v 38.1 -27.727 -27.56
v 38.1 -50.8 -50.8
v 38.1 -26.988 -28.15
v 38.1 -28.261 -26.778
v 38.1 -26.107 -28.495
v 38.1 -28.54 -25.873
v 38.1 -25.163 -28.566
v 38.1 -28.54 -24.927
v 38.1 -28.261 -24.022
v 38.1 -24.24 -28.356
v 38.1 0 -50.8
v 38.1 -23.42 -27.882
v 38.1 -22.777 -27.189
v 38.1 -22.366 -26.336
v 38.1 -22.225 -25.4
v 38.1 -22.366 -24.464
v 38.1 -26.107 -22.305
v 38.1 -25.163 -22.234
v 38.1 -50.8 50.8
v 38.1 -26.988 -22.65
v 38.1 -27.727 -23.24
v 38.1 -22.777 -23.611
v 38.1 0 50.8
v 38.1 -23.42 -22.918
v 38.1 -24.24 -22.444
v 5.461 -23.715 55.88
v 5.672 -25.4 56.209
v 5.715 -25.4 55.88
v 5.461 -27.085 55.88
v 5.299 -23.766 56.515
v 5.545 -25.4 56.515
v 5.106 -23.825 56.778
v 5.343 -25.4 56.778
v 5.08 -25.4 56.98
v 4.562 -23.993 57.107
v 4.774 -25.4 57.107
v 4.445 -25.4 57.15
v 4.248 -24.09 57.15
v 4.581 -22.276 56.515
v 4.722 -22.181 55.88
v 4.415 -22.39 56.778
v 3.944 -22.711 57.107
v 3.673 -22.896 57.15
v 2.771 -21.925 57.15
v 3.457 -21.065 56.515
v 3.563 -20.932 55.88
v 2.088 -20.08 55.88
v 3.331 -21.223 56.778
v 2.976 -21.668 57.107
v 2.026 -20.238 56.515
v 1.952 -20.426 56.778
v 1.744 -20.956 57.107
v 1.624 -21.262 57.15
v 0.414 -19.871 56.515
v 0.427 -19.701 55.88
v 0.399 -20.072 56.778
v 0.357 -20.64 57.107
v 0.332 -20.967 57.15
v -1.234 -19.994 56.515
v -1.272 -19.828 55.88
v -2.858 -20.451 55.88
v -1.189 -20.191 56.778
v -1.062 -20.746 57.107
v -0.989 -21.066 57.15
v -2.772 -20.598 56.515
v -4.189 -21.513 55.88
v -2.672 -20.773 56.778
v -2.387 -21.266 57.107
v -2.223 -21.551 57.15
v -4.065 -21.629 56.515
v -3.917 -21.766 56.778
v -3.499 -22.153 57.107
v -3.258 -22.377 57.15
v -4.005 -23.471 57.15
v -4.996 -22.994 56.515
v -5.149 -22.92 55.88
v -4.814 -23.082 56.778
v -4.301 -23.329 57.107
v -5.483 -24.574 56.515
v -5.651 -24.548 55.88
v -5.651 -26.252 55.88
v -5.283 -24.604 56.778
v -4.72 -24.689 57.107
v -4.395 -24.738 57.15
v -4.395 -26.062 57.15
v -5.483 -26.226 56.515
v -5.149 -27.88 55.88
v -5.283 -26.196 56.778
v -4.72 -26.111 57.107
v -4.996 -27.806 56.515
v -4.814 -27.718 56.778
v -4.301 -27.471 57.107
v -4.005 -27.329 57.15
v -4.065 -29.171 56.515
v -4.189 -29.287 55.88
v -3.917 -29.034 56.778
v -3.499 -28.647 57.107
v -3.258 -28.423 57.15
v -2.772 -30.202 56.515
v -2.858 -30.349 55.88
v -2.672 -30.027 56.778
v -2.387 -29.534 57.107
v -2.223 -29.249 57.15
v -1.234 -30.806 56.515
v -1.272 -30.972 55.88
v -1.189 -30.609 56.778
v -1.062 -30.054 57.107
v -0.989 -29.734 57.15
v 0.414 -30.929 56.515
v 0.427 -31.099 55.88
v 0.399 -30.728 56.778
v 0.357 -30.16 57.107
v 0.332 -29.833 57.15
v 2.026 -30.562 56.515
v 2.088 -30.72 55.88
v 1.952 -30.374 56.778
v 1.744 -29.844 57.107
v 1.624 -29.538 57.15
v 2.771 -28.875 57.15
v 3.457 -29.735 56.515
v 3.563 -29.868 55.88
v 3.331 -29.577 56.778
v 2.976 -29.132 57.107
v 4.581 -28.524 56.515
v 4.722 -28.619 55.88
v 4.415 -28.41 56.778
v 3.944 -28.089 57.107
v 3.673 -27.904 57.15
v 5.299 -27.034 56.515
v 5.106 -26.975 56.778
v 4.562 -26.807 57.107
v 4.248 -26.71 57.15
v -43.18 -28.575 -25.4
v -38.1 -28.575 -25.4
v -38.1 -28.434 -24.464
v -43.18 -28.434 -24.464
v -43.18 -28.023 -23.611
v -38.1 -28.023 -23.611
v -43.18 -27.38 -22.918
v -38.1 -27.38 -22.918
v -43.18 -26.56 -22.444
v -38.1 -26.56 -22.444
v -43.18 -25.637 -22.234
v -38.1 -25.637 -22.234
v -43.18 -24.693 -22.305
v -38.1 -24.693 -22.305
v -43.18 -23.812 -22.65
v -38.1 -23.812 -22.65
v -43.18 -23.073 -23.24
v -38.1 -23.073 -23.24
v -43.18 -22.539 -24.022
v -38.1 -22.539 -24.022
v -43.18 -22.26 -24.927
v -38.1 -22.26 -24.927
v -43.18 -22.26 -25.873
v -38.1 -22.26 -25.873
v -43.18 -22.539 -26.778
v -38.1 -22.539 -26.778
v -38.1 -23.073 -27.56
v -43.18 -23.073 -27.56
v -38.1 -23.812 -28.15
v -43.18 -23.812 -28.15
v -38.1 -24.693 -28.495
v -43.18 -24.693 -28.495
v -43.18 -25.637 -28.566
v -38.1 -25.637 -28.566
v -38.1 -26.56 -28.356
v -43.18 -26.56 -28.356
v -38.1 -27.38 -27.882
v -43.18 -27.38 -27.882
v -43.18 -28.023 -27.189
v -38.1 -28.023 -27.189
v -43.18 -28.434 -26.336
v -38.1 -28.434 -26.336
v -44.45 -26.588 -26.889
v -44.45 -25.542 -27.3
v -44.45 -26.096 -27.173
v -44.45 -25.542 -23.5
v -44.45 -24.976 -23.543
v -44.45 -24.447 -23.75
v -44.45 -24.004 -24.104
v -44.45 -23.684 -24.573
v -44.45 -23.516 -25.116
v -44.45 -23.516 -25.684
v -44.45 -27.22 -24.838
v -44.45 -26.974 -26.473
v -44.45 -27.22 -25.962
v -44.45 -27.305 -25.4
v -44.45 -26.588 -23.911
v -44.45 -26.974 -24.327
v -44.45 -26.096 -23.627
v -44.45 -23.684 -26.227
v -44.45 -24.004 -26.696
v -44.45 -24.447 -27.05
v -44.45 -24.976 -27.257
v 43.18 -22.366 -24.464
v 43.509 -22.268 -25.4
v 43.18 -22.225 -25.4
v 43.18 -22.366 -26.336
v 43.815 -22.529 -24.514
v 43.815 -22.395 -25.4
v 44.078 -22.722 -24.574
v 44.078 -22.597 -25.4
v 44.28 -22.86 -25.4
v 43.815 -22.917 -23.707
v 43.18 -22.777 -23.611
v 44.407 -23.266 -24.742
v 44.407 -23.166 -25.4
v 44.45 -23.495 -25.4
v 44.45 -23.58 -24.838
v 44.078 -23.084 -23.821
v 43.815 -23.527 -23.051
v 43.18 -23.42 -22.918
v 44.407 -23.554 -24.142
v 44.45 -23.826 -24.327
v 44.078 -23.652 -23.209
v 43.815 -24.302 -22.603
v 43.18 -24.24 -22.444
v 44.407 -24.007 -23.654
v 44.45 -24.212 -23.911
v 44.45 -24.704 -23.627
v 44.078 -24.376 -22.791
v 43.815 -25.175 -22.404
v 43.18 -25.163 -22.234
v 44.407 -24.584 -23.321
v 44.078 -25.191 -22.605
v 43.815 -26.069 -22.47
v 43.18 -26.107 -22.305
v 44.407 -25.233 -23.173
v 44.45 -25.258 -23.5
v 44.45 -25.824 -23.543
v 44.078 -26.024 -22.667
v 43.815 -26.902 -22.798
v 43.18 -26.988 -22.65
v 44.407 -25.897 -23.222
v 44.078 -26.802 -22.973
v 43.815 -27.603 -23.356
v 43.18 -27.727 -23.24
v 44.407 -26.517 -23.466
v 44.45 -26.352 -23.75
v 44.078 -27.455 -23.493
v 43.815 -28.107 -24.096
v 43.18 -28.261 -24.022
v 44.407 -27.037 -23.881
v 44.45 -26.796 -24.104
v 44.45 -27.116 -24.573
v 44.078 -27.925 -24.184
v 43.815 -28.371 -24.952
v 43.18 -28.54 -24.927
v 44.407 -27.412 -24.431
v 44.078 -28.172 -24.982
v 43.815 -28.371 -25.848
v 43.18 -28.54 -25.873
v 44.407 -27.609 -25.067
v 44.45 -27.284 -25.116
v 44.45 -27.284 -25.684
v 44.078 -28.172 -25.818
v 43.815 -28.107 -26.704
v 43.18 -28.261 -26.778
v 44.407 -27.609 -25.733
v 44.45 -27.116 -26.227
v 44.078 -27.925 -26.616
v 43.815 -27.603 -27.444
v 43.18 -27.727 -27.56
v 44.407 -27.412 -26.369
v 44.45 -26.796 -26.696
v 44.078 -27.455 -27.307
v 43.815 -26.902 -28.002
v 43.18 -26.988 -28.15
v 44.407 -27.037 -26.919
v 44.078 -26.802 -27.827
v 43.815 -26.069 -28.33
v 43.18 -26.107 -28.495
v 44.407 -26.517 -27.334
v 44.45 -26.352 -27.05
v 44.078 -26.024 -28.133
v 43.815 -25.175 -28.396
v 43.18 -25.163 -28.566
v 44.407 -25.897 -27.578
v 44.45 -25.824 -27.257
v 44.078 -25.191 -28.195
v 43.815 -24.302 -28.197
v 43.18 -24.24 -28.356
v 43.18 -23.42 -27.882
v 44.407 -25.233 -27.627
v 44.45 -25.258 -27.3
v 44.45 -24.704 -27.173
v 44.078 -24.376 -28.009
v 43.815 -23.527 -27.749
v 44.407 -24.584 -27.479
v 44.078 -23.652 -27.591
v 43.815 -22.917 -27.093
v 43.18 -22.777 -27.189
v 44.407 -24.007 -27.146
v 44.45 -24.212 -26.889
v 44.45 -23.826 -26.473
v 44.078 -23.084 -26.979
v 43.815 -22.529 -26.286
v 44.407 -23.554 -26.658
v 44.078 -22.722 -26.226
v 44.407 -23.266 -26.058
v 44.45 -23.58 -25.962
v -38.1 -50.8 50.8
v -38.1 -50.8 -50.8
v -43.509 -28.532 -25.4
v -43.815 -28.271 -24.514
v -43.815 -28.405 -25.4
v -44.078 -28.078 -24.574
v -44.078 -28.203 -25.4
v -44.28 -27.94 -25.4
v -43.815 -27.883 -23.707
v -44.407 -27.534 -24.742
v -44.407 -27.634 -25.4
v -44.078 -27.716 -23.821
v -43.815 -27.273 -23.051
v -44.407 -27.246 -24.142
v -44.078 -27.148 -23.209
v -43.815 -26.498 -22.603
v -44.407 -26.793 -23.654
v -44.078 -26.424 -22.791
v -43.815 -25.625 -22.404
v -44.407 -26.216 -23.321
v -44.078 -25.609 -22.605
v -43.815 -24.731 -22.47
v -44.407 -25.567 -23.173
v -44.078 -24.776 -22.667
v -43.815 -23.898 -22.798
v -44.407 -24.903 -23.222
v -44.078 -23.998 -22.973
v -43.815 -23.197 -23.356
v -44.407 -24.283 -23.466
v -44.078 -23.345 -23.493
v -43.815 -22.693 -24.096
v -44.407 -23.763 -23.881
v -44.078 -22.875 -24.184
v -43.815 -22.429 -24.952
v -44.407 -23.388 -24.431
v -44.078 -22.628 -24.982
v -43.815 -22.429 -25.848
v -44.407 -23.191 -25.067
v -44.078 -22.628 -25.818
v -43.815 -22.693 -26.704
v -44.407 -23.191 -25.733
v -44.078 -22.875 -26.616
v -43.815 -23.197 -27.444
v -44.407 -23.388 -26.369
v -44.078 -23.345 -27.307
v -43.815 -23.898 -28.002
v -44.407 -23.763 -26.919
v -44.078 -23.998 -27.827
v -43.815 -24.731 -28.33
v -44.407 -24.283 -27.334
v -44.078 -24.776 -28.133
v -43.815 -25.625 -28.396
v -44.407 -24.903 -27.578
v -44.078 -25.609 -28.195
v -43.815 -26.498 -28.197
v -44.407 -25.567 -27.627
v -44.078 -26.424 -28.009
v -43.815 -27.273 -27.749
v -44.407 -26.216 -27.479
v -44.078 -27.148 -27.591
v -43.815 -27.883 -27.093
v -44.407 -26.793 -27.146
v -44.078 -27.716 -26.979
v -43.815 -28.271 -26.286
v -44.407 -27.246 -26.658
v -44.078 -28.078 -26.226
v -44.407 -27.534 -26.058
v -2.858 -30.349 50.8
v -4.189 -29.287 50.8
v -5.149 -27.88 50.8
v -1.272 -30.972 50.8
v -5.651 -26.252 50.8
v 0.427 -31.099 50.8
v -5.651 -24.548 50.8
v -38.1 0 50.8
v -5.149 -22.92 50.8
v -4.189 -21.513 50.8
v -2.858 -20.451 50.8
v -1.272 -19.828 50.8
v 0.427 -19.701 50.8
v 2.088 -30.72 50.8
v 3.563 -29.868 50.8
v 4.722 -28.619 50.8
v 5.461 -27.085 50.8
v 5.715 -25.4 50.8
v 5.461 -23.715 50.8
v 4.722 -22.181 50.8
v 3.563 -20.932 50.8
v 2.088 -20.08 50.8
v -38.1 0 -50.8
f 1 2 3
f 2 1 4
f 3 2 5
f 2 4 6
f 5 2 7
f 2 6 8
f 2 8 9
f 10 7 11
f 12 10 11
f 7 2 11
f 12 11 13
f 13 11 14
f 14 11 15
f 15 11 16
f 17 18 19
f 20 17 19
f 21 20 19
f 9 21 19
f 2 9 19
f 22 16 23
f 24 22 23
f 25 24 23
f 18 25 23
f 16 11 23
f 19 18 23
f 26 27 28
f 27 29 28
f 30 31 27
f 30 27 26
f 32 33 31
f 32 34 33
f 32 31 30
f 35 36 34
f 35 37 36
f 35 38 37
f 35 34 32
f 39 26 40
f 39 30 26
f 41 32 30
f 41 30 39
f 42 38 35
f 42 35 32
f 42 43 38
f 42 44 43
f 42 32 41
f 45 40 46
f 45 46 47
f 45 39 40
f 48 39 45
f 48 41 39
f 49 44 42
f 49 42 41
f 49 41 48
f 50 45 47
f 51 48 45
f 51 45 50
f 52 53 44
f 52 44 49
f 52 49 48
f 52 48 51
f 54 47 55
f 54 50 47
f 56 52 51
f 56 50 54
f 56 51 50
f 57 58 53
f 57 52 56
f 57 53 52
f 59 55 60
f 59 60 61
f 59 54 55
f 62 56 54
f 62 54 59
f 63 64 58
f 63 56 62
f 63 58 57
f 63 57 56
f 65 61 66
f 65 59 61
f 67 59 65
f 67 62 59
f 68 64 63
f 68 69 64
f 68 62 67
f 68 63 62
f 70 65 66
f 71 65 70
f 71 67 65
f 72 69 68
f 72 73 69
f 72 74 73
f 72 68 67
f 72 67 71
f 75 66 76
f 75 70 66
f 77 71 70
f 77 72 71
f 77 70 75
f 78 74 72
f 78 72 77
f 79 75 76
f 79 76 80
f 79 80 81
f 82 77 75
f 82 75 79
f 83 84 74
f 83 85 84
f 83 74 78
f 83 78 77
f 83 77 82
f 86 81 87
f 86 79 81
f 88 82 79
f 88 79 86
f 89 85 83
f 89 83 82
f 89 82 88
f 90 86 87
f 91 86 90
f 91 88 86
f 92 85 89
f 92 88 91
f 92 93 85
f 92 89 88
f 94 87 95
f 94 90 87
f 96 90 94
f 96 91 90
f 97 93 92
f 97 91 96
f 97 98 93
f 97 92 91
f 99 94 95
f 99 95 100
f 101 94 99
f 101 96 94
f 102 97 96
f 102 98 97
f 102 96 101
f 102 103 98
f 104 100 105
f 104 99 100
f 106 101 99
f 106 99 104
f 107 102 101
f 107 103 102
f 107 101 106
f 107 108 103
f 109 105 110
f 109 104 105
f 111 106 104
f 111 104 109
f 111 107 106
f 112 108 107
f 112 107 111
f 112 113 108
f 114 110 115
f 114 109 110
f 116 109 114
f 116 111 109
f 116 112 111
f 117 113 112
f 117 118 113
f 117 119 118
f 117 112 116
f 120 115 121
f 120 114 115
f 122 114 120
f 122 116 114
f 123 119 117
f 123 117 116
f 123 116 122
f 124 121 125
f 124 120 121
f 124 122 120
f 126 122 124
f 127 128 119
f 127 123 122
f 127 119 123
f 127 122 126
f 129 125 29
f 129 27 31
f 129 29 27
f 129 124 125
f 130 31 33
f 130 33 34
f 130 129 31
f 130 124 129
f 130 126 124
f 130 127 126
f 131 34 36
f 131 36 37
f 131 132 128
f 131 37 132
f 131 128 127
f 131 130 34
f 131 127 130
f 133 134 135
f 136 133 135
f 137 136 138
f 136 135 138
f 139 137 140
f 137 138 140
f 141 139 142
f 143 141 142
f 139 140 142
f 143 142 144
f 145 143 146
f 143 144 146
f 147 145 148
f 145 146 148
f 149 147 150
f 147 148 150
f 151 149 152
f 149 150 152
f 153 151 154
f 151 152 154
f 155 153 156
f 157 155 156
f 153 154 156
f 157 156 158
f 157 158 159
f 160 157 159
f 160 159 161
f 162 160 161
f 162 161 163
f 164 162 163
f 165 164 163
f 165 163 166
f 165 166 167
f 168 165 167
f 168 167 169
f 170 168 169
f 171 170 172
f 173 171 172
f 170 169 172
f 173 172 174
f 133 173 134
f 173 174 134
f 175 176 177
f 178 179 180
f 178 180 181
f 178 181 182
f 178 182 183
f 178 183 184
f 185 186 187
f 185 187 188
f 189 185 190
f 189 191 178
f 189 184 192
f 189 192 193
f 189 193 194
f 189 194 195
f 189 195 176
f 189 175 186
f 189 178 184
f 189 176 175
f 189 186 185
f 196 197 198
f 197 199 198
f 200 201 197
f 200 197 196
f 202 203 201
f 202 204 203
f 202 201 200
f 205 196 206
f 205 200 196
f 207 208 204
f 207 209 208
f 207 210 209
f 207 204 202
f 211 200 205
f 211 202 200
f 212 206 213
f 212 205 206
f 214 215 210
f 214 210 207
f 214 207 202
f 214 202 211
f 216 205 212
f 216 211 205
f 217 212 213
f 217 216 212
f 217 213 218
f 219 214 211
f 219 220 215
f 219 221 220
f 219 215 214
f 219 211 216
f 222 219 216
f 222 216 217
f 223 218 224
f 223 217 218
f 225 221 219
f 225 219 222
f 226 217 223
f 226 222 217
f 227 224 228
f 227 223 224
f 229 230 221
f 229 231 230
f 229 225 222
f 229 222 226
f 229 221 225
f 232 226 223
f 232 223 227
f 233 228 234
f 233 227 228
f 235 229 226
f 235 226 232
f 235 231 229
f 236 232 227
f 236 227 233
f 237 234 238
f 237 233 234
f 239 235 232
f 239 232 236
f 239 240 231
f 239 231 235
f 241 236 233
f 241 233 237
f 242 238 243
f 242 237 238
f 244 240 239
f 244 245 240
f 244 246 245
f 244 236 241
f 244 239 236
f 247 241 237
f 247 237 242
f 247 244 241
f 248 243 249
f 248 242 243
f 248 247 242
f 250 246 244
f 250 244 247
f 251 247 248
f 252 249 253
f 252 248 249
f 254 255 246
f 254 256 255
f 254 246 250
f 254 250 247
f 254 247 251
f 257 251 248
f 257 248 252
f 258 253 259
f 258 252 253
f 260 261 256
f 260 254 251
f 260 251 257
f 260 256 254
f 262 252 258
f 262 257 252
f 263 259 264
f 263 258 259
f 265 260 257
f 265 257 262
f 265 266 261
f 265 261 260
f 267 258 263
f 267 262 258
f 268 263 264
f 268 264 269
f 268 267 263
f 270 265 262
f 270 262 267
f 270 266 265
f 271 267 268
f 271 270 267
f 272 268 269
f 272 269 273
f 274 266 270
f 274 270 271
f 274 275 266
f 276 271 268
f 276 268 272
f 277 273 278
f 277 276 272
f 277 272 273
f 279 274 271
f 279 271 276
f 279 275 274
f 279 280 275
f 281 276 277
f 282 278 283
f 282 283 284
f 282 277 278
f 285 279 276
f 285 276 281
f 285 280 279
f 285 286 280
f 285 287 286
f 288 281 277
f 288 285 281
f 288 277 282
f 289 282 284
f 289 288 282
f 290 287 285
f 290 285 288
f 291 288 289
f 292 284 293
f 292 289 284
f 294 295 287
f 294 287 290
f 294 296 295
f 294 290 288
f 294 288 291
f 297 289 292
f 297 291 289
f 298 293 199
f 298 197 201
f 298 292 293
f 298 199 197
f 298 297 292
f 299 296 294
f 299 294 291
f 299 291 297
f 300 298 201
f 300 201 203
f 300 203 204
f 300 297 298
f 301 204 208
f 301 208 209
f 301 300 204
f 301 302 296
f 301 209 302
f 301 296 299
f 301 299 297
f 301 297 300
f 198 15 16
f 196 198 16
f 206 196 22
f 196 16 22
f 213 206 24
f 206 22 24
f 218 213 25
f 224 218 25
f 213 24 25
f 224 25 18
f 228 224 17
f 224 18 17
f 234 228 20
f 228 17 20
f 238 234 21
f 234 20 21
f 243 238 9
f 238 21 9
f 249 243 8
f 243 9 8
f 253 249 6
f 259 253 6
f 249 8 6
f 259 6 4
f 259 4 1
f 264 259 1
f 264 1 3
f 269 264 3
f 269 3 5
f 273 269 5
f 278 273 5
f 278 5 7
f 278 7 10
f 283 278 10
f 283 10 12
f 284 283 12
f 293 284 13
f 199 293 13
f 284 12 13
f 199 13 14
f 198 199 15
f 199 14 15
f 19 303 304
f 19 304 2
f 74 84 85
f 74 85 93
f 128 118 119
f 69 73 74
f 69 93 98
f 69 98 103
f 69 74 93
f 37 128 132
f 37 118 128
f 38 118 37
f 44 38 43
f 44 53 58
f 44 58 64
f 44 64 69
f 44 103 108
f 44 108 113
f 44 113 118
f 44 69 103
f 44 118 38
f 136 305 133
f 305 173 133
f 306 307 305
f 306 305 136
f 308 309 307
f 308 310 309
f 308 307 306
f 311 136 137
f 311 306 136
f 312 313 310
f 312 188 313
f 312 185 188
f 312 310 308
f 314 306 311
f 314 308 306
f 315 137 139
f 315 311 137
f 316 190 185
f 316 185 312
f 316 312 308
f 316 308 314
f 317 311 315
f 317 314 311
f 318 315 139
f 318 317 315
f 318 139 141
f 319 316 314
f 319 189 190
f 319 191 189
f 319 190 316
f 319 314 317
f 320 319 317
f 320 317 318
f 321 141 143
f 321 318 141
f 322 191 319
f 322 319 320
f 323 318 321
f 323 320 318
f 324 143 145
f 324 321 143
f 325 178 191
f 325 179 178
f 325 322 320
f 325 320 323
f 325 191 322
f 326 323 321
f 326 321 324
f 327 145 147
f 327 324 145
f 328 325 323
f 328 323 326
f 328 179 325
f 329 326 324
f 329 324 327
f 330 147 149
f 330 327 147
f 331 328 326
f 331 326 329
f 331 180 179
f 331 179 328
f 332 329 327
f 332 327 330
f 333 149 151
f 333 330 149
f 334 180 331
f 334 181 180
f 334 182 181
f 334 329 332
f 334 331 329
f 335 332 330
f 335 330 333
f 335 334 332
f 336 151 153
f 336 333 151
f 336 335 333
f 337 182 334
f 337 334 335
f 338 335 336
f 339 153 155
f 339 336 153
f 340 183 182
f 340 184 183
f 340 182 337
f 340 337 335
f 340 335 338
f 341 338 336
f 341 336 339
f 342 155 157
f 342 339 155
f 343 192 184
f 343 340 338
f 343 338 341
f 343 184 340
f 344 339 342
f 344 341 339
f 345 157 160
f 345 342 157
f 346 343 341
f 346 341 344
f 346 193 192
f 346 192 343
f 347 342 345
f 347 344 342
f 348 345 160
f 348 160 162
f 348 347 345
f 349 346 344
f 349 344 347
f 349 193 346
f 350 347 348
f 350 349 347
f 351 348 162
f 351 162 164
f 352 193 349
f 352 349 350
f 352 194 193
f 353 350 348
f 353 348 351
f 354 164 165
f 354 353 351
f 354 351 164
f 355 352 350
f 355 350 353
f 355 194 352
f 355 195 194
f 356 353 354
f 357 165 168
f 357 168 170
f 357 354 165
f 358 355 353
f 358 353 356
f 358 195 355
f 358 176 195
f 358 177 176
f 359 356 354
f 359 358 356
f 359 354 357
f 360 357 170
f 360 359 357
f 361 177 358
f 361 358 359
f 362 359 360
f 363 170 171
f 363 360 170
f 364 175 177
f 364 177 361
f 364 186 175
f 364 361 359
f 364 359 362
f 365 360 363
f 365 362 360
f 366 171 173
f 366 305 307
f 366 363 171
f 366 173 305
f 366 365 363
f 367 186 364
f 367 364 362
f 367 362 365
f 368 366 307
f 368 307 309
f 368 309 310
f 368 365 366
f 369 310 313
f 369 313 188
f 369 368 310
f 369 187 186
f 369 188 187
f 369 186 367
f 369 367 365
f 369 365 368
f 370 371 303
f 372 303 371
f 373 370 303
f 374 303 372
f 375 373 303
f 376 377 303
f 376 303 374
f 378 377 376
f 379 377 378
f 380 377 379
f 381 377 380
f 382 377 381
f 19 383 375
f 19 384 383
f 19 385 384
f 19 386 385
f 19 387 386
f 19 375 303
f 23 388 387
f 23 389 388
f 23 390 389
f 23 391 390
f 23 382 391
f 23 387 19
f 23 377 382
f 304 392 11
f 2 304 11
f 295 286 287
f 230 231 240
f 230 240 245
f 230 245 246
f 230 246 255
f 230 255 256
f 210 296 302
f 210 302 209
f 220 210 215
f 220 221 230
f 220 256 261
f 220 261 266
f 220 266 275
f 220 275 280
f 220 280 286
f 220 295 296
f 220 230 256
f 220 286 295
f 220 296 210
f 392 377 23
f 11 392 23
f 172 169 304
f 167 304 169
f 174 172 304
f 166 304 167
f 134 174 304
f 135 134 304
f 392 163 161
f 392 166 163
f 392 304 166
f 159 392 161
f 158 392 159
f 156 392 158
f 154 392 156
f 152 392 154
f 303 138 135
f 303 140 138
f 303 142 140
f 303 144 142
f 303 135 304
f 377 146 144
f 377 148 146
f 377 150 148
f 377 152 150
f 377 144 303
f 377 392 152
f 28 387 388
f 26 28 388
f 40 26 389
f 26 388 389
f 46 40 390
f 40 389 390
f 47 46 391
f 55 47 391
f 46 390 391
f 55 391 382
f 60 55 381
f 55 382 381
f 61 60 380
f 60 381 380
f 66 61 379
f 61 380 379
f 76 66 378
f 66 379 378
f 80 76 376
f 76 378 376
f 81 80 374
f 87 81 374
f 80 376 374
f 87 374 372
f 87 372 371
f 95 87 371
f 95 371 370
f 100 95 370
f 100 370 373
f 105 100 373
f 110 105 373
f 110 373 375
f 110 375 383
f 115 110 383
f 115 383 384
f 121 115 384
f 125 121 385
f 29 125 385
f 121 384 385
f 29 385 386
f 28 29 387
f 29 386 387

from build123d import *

# Parameters (mm, degrees)
F0_W     = 76.2
F0_H     = 101.6
F1_DEPTH = 50.8
F3_R     = 3.175
F5_DEPTH = 6.35
F2_R     = 3.175
F6_DEPTH = 6.35
F4_R     = 5.715
F7_DEPTH = 6.35
F8_R     = 1.27


with BuildPart() as f1:
    # F0 (on Front) → F1 (new body)
    with BuildSketch(Plane.XZ):
        Rectangle(F0_W, F0_H)
    extrude(amount=F1_DEPTH)

    # F3 (on face) → F5 (join)
    with BuildSketch(Plane(origin=(-38.1, 0, 0), x_dir=(0, -1, 0), z_dir=(-1, 0, 0))):
        with Locations((25.4, -25.4)):
            Circle(F3_R)
    extrude(amount=F5_DEPTH)

    # F2 (on face) → F6 (join)
    with BuildSketch(Plane.YZ.offset(38.1)):
        with Locations((-25.4, -25.4)):
            Circle(F2_R)
    extrude(amount=F6_DEPTH)

    # F4 (on face) → F7 (join)
    with BuildSketch(Plane.XY.offset(50.8)):
        with Locations((0, -25.4)):
            Circle(F4_R)
    extrude(amount=F7_DEPTH)

    # F8
    f8_edges = [f1.edges().sort_by_distance(p)[0] for p in [
        (44.45, -28.575, -25.4),
        (-5.715, -25.4, 57.15),
        (-44.45, -22.225, -25.4),
    ]]
    fillet(f8_edges, radius=F8_R)


solid = f1.part
